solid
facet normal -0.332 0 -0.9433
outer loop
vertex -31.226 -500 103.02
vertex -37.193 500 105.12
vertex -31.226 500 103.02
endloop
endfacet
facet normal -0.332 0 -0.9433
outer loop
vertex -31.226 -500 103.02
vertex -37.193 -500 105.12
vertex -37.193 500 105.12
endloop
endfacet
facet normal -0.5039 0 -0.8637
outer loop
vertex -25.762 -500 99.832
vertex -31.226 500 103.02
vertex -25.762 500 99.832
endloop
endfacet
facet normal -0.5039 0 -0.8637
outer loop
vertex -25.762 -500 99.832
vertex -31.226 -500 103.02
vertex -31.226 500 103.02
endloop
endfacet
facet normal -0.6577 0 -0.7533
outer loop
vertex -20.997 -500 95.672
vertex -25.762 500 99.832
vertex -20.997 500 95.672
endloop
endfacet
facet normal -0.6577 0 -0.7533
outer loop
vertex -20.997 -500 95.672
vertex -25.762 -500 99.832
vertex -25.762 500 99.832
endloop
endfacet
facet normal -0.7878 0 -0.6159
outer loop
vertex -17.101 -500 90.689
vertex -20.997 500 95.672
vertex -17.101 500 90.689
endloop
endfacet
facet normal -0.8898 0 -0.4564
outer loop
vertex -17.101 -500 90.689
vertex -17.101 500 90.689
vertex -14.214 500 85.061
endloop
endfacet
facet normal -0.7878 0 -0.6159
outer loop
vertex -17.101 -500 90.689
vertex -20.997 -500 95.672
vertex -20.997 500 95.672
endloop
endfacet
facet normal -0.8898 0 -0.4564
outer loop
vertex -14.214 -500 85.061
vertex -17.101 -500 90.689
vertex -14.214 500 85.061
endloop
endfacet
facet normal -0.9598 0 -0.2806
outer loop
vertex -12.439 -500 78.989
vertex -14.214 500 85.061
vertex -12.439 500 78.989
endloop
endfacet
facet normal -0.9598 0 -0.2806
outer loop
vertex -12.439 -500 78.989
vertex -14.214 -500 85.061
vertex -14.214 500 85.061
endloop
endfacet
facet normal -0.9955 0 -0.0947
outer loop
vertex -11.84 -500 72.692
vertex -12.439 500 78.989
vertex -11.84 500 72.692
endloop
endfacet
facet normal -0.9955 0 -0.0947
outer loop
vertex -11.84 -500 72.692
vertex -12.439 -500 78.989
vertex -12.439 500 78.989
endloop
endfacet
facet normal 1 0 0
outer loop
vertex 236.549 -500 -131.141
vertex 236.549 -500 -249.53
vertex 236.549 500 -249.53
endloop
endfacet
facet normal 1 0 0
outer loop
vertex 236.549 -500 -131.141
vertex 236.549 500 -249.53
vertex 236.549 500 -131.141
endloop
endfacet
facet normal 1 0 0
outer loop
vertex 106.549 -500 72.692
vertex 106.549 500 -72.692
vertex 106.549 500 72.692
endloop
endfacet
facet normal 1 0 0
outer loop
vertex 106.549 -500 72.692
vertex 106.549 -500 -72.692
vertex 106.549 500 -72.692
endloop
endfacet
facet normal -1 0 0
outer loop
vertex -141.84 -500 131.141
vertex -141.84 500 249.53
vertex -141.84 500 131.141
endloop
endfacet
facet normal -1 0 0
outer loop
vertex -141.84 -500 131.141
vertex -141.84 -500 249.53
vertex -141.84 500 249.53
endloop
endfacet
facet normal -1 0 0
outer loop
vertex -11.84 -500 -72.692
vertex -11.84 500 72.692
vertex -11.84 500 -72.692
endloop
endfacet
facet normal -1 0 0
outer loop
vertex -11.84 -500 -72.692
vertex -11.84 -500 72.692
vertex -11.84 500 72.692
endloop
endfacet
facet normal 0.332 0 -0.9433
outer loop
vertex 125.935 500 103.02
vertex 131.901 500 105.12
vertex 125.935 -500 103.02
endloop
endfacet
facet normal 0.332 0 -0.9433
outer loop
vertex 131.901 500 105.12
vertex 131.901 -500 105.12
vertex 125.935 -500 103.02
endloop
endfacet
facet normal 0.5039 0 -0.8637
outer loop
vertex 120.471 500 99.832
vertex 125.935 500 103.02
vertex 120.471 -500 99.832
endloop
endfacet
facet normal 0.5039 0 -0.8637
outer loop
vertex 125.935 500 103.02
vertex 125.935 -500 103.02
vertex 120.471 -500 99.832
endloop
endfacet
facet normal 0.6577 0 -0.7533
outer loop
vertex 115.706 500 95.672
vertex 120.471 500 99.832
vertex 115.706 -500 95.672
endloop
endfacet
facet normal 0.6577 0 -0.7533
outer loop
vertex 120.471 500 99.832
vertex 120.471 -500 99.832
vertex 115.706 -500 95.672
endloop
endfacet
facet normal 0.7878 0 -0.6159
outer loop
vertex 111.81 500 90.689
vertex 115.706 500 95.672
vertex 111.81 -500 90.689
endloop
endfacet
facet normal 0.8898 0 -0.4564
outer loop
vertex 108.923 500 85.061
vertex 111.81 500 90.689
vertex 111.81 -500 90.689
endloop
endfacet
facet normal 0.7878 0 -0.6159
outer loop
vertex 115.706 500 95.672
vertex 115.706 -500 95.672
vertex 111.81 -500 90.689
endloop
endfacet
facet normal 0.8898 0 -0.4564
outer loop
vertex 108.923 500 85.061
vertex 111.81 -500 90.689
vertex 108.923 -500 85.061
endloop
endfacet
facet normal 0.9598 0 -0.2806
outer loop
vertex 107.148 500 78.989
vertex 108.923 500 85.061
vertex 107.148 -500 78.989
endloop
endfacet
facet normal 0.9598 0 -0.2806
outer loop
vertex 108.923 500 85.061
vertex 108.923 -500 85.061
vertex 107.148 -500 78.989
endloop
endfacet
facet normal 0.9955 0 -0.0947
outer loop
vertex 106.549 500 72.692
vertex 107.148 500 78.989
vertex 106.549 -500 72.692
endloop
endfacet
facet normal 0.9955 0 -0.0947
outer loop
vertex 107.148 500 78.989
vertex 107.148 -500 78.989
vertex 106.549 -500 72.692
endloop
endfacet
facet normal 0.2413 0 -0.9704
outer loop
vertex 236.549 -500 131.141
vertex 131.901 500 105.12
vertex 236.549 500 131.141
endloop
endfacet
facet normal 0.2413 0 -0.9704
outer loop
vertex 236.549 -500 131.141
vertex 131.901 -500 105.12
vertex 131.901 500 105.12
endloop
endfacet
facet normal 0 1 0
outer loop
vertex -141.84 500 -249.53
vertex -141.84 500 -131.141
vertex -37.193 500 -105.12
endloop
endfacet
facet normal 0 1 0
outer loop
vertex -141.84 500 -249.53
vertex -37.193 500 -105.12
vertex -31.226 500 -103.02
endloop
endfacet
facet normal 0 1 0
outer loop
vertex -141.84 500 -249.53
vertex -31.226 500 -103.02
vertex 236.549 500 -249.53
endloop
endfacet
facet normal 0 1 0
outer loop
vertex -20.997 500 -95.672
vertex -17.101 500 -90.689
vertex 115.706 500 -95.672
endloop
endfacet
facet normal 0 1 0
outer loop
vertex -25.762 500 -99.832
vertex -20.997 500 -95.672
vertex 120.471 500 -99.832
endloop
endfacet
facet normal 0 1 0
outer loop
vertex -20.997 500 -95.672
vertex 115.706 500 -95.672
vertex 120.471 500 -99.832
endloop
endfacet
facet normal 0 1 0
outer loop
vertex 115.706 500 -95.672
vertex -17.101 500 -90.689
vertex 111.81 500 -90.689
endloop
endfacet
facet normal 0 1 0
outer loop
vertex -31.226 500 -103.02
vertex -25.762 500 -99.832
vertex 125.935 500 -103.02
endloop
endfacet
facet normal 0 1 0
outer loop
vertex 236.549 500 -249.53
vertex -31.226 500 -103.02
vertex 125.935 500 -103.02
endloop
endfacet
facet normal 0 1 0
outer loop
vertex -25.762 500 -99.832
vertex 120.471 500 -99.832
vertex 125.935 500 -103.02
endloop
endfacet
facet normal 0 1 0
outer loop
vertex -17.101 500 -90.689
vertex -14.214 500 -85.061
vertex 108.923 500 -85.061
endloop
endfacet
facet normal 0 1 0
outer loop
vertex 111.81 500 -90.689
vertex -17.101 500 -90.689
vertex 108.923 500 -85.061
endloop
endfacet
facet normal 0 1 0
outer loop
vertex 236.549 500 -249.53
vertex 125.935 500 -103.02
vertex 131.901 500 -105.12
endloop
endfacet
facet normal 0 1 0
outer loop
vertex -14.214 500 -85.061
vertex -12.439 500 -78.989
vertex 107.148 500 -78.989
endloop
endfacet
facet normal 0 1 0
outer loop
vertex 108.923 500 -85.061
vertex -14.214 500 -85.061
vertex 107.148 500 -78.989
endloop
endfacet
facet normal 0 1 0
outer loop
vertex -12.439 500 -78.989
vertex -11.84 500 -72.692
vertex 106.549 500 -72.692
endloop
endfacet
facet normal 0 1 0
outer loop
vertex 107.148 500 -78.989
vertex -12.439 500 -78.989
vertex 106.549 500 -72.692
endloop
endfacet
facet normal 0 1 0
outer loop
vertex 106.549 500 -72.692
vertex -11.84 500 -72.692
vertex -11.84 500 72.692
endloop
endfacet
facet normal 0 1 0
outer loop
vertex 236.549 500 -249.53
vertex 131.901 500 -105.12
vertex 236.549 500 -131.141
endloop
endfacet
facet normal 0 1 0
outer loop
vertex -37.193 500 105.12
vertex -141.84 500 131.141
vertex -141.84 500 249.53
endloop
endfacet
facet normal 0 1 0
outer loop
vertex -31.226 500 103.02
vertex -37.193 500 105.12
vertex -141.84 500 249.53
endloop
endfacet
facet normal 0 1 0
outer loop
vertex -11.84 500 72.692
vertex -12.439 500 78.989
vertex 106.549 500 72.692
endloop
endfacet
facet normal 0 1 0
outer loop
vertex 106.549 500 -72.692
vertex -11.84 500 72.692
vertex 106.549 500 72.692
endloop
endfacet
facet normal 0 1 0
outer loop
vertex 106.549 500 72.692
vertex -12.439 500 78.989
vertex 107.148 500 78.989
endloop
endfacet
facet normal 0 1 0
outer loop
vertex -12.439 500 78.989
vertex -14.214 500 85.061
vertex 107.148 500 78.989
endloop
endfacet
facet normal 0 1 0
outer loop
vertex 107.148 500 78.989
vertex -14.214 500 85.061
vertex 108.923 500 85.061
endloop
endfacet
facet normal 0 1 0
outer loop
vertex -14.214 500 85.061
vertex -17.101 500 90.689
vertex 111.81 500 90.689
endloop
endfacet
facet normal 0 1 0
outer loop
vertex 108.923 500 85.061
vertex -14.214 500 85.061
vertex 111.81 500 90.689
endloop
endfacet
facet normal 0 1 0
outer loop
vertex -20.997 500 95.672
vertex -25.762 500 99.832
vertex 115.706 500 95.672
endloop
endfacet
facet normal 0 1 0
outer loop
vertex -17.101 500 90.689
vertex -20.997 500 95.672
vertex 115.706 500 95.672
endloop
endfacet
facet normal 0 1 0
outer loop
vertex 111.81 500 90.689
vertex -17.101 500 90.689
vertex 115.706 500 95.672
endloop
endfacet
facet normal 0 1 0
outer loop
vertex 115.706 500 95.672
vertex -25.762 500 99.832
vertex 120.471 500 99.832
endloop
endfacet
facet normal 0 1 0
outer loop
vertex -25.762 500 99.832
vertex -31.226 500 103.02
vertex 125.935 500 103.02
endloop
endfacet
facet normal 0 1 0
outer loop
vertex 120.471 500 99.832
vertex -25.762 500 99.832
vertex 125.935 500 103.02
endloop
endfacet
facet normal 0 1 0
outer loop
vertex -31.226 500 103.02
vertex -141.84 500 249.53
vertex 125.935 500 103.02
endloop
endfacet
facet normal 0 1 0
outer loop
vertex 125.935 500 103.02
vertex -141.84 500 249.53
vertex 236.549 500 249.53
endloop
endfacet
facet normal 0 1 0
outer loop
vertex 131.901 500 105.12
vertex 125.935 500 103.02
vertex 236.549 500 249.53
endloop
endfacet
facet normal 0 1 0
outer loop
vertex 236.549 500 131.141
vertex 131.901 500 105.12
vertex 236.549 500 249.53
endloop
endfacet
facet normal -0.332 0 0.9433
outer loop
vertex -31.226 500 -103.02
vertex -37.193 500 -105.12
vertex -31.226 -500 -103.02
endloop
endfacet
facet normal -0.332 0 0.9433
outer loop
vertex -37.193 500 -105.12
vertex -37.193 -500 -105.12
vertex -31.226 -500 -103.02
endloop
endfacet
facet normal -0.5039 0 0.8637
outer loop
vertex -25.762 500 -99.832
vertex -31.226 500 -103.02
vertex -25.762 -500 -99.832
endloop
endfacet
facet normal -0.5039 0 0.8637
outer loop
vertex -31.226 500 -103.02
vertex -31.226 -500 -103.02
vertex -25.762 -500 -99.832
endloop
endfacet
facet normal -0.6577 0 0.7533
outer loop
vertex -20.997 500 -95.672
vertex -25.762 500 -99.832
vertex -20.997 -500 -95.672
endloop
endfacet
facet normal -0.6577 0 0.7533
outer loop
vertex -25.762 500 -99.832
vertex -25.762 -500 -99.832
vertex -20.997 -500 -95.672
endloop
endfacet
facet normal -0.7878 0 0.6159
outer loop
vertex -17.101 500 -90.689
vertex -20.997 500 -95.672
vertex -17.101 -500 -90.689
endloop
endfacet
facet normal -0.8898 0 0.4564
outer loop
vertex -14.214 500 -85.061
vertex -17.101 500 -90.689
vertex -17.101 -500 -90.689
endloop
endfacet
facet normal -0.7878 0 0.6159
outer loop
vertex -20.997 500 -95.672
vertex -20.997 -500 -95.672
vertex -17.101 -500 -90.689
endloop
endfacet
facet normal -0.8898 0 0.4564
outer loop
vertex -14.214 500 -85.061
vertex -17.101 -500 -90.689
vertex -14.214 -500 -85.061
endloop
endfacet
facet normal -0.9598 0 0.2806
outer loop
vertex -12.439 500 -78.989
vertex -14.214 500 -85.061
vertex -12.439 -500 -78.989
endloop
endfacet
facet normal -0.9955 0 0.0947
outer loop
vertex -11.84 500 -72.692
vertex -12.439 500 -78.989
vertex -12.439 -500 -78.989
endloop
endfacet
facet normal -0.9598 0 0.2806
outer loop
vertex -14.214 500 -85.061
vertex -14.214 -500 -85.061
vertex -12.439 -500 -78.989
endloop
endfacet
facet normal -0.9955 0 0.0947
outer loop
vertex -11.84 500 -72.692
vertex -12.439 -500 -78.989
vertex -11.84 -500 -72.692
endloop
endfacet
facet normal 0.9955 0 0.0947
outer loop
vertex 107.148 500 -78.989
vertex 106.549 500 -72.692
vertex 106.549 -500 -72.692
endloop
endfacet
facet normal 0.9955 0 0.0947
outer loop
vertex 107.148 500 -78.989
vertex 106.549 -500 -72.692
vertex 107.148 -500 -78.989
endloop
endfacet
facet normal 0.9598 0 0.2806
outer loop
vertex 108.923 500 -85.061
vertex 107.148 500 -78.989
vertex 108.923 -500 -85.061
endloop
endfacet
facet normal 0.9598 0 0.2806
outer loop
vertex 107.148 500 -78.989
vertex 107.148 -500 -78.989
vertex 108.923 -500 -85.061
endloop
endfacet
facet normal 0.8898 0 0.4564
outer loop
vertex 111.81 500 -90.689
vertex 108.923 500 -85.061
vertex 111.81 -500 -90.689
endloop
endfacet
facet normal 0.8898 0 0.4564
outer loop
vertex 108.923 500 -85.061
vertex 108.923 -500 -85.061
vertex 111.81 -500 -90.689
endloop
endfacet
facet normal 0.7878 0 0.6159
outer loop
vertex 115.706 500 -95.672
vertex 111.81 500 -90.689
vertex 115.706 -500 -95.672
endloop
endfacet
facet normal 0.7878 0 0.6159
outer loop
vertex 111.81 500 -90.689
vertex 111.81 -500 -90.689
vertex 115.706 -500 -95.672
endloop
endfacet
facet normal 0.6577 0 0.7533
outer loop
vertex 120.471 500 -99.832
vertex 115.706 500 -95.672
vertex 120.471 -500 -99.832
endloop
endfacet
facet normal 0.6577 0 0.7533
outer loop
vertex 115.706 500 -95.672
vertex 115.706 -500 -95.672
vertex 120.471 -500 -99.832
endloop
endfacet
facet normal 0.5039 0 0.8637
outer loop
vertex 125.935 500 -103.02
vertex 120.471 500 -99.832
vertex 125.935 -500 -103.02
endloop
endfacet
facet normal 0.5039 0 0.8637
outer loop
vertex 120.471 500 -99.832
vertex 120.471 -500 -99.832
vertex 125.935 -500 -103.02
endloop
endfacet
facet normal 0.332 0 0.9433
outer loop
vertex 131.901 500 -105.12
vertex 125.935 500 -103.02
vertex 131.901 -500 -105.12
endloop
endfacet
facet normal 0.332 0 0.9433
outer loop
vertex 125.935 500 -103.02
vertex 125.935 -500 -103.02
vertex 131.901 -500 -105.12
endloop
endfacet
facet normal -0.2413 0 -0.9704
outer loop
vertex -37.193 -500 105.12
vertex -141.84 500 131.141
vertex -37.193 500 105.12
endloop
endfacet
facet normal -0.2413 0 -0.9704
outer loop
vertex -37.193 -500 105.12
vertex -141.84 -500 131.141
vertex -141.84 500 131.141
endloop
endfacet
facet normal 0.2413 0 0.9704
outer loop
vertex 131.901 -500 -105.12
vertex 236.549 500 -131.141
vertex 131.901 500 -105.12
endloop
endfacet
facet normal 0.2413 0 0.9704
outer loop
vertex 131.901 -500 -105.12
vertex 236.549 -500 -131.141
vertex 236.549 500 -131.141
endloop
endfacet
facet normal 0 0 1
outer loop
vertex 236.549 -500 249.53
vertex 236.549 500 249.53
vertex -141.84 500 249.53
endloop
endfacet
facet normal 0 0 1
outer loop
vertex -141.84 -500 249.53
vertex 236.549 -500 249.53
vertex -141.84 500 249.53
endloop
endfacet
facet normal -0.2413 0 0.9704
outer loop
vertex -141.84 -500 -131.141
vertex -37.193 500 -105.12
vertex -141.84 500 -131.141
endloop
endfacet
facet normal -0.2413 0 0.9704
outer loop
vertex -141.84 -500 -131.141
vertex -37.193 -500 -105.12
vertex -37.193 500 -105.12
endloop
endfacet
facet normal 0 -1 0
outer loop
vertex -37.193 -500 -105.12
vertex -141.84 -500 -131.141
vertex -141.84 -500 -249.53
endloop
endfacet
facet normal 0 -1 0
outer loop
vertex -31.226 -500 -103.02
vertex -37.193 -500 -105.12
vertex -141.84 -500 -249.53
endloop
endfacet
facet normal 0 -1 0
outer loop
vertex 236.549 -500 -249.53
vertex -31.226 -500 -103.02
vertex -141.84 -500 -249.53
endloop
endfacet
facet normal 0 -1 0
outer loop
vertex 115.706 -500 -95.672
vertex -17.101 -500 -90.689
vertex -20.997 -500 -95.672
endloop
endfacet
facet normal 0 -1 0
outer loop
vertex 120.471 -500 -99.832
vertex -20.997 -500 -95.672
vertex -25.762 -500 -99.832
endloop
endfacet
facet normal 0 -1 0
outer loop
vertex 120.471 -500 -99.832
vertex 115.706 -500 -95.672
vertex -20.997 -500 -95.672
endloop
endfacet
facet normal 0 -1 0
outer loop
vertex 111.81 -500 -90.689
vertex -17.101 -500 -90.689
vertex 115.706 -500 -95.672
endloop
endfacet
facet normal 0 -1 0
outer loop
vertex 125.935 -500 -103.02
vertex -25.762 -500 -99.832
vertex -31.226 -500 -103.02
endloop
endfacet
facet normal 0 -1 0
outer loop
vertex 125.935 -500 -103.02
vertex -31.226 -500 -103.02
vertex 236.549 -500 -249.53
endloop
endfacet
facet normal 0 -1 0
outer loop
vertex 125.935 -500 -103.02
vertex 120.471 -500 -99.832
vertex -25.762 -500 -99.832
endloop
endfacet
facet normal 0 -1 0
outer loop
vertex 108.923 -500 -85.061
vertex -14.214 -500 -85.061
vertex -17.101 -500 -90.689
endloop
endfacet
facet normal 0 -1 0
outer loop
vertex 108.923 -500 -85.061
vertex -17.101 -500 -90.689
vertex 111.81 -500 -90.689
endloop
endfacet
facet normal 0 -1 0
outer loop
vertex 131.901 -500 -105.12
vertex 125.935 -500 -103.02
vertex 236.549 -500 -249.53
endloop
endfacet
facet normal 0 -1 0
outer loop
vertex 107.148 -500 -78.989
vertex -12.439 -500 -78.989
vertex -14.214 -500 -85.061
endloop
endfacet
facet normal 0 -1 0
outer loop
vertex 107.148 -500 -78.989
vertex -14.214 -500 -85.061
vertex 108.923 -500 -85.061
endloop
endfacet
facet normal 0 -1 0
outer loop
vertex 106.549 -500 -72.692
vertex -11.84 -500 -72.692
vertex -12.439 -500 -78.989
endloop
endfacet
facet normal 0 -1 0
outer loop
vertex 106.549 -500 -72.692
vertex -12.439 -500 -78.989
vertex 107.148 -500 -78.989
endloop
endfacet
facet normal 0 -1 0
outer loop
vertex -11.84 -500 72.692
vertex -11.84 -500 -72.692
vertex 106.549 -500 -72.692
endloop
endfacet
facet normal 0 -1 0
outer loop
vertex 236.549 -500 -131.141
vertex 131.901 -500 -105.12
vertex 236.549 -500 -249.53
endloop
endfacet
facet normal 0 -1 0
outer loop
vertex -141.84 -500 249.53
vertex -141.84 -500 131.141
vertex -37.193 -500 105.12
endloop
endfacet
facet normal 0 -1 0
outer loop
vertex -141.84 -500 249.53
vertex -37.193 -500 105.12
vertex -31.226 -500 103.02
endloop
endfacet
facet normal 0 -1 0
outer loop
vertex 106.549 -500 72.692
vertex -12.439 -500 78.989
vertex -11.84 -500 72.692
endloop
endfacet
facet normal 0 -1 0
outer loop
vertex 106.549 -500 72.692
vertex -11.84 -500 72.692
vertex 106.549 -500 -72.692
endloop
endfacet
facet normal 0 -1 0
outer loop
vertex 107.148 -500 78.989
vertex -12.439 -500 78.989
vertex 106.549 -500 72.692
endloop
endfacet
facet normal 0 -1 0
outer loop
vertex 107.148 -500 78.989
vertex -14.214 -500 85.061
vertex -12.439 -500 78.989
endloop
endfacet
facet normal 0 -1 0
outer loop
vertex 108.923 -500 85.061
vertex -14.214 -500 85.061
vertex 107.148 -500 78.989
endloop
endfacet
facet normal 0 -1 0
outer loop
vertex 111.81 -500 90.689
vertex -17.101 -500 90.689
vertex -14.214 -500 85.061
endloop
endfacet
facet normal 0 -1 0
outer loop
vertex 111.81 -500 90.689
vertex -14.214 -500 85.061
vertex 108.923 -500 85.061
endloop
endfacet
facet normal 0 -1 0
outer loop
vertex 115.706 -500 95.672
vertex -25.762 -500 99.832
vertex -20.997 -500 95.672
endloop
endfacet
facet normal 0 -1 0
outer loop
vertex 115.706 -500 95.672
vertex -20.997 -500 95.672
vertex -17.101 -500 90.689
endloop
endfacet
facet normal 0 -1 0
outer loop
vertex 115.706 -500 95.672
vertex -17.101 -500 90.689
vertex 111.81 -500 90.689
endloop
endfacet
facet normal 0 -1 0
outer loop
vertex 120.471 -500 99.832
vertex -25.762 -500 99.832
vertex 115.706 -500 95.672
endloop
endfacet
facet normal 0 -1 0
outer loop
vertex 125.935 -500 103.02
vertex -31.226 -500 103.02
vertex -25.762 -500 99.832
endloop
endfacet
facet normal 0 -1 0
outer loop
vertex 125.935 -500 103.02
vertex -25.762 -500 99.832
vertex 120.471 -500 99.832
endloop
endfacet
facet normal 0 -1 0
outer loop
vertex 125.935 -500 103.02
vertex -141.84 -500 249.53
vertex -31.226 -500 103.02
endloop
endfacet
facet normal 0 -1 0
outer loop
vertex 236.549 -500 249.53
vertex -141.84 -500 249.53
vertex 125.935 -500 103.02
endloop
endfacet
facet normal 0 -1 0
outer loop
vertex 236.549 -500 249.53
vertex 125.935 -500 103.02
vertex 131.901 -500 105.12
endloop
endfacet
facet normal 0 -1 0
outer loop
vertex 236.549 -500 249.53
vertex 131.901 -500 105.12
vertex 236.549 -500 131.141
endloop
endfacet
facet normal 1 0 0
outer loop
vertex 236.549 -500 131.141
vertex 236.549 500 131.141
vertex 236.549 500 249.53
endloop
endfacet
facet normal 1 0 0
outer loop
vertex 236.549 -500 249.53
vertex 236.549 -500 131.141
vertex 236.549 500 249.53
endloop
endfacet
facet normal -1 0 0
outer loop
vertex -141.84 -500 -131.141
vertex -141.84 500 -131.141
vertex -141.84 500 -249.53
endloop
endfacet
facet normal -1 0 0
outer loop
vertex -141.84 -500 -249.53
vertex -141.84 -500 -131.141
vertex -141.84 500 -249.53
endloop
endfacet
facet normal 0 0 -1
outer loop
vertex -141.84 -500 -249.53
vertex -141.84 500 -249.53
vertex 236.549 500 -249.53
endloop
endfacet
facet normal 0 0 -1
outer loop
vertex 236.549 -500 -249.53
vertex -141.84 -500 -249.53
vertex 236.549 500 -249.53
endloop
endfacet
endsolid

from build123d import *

# Parameters (mm, degrees)
F1_DEPTH = 500
F2_R     = 33.415616


with BuildPart() as f1:
    # F0 (on Front) → F1 (new body, symmetric)
    with BuildSketch(Plane.XZ):
        Polygon((-141.84029, 131.140749), (-11.84029, 98.816335), (-11.84029, -98.816335), (-141.84029, -131.140749), (-141.84029, -249.530149), (236.54911, -249.530149), (236.54911, -131.140749), (106.54911, -98.816335), (106.54911, 98.816335), (236.54911, 131.140749), (236.54911, 249.530149), (-141.84029, 249.530149), align=None)
    extrude(amount=F1_DEPTH, both=True)

    # F2
    f2_edges = [f1.edges().sort_by_distance(p)[0] for p in [
        (106.54911, 0, -98.816335),
        (-11.84029, 0, 98.816335),
        (-11.84029, 0, -98.816335),
        (106.54911, 0, 98.816335),
    ]]
    fillet(f2_edges, radius=F2_R)


solid = f1.part
